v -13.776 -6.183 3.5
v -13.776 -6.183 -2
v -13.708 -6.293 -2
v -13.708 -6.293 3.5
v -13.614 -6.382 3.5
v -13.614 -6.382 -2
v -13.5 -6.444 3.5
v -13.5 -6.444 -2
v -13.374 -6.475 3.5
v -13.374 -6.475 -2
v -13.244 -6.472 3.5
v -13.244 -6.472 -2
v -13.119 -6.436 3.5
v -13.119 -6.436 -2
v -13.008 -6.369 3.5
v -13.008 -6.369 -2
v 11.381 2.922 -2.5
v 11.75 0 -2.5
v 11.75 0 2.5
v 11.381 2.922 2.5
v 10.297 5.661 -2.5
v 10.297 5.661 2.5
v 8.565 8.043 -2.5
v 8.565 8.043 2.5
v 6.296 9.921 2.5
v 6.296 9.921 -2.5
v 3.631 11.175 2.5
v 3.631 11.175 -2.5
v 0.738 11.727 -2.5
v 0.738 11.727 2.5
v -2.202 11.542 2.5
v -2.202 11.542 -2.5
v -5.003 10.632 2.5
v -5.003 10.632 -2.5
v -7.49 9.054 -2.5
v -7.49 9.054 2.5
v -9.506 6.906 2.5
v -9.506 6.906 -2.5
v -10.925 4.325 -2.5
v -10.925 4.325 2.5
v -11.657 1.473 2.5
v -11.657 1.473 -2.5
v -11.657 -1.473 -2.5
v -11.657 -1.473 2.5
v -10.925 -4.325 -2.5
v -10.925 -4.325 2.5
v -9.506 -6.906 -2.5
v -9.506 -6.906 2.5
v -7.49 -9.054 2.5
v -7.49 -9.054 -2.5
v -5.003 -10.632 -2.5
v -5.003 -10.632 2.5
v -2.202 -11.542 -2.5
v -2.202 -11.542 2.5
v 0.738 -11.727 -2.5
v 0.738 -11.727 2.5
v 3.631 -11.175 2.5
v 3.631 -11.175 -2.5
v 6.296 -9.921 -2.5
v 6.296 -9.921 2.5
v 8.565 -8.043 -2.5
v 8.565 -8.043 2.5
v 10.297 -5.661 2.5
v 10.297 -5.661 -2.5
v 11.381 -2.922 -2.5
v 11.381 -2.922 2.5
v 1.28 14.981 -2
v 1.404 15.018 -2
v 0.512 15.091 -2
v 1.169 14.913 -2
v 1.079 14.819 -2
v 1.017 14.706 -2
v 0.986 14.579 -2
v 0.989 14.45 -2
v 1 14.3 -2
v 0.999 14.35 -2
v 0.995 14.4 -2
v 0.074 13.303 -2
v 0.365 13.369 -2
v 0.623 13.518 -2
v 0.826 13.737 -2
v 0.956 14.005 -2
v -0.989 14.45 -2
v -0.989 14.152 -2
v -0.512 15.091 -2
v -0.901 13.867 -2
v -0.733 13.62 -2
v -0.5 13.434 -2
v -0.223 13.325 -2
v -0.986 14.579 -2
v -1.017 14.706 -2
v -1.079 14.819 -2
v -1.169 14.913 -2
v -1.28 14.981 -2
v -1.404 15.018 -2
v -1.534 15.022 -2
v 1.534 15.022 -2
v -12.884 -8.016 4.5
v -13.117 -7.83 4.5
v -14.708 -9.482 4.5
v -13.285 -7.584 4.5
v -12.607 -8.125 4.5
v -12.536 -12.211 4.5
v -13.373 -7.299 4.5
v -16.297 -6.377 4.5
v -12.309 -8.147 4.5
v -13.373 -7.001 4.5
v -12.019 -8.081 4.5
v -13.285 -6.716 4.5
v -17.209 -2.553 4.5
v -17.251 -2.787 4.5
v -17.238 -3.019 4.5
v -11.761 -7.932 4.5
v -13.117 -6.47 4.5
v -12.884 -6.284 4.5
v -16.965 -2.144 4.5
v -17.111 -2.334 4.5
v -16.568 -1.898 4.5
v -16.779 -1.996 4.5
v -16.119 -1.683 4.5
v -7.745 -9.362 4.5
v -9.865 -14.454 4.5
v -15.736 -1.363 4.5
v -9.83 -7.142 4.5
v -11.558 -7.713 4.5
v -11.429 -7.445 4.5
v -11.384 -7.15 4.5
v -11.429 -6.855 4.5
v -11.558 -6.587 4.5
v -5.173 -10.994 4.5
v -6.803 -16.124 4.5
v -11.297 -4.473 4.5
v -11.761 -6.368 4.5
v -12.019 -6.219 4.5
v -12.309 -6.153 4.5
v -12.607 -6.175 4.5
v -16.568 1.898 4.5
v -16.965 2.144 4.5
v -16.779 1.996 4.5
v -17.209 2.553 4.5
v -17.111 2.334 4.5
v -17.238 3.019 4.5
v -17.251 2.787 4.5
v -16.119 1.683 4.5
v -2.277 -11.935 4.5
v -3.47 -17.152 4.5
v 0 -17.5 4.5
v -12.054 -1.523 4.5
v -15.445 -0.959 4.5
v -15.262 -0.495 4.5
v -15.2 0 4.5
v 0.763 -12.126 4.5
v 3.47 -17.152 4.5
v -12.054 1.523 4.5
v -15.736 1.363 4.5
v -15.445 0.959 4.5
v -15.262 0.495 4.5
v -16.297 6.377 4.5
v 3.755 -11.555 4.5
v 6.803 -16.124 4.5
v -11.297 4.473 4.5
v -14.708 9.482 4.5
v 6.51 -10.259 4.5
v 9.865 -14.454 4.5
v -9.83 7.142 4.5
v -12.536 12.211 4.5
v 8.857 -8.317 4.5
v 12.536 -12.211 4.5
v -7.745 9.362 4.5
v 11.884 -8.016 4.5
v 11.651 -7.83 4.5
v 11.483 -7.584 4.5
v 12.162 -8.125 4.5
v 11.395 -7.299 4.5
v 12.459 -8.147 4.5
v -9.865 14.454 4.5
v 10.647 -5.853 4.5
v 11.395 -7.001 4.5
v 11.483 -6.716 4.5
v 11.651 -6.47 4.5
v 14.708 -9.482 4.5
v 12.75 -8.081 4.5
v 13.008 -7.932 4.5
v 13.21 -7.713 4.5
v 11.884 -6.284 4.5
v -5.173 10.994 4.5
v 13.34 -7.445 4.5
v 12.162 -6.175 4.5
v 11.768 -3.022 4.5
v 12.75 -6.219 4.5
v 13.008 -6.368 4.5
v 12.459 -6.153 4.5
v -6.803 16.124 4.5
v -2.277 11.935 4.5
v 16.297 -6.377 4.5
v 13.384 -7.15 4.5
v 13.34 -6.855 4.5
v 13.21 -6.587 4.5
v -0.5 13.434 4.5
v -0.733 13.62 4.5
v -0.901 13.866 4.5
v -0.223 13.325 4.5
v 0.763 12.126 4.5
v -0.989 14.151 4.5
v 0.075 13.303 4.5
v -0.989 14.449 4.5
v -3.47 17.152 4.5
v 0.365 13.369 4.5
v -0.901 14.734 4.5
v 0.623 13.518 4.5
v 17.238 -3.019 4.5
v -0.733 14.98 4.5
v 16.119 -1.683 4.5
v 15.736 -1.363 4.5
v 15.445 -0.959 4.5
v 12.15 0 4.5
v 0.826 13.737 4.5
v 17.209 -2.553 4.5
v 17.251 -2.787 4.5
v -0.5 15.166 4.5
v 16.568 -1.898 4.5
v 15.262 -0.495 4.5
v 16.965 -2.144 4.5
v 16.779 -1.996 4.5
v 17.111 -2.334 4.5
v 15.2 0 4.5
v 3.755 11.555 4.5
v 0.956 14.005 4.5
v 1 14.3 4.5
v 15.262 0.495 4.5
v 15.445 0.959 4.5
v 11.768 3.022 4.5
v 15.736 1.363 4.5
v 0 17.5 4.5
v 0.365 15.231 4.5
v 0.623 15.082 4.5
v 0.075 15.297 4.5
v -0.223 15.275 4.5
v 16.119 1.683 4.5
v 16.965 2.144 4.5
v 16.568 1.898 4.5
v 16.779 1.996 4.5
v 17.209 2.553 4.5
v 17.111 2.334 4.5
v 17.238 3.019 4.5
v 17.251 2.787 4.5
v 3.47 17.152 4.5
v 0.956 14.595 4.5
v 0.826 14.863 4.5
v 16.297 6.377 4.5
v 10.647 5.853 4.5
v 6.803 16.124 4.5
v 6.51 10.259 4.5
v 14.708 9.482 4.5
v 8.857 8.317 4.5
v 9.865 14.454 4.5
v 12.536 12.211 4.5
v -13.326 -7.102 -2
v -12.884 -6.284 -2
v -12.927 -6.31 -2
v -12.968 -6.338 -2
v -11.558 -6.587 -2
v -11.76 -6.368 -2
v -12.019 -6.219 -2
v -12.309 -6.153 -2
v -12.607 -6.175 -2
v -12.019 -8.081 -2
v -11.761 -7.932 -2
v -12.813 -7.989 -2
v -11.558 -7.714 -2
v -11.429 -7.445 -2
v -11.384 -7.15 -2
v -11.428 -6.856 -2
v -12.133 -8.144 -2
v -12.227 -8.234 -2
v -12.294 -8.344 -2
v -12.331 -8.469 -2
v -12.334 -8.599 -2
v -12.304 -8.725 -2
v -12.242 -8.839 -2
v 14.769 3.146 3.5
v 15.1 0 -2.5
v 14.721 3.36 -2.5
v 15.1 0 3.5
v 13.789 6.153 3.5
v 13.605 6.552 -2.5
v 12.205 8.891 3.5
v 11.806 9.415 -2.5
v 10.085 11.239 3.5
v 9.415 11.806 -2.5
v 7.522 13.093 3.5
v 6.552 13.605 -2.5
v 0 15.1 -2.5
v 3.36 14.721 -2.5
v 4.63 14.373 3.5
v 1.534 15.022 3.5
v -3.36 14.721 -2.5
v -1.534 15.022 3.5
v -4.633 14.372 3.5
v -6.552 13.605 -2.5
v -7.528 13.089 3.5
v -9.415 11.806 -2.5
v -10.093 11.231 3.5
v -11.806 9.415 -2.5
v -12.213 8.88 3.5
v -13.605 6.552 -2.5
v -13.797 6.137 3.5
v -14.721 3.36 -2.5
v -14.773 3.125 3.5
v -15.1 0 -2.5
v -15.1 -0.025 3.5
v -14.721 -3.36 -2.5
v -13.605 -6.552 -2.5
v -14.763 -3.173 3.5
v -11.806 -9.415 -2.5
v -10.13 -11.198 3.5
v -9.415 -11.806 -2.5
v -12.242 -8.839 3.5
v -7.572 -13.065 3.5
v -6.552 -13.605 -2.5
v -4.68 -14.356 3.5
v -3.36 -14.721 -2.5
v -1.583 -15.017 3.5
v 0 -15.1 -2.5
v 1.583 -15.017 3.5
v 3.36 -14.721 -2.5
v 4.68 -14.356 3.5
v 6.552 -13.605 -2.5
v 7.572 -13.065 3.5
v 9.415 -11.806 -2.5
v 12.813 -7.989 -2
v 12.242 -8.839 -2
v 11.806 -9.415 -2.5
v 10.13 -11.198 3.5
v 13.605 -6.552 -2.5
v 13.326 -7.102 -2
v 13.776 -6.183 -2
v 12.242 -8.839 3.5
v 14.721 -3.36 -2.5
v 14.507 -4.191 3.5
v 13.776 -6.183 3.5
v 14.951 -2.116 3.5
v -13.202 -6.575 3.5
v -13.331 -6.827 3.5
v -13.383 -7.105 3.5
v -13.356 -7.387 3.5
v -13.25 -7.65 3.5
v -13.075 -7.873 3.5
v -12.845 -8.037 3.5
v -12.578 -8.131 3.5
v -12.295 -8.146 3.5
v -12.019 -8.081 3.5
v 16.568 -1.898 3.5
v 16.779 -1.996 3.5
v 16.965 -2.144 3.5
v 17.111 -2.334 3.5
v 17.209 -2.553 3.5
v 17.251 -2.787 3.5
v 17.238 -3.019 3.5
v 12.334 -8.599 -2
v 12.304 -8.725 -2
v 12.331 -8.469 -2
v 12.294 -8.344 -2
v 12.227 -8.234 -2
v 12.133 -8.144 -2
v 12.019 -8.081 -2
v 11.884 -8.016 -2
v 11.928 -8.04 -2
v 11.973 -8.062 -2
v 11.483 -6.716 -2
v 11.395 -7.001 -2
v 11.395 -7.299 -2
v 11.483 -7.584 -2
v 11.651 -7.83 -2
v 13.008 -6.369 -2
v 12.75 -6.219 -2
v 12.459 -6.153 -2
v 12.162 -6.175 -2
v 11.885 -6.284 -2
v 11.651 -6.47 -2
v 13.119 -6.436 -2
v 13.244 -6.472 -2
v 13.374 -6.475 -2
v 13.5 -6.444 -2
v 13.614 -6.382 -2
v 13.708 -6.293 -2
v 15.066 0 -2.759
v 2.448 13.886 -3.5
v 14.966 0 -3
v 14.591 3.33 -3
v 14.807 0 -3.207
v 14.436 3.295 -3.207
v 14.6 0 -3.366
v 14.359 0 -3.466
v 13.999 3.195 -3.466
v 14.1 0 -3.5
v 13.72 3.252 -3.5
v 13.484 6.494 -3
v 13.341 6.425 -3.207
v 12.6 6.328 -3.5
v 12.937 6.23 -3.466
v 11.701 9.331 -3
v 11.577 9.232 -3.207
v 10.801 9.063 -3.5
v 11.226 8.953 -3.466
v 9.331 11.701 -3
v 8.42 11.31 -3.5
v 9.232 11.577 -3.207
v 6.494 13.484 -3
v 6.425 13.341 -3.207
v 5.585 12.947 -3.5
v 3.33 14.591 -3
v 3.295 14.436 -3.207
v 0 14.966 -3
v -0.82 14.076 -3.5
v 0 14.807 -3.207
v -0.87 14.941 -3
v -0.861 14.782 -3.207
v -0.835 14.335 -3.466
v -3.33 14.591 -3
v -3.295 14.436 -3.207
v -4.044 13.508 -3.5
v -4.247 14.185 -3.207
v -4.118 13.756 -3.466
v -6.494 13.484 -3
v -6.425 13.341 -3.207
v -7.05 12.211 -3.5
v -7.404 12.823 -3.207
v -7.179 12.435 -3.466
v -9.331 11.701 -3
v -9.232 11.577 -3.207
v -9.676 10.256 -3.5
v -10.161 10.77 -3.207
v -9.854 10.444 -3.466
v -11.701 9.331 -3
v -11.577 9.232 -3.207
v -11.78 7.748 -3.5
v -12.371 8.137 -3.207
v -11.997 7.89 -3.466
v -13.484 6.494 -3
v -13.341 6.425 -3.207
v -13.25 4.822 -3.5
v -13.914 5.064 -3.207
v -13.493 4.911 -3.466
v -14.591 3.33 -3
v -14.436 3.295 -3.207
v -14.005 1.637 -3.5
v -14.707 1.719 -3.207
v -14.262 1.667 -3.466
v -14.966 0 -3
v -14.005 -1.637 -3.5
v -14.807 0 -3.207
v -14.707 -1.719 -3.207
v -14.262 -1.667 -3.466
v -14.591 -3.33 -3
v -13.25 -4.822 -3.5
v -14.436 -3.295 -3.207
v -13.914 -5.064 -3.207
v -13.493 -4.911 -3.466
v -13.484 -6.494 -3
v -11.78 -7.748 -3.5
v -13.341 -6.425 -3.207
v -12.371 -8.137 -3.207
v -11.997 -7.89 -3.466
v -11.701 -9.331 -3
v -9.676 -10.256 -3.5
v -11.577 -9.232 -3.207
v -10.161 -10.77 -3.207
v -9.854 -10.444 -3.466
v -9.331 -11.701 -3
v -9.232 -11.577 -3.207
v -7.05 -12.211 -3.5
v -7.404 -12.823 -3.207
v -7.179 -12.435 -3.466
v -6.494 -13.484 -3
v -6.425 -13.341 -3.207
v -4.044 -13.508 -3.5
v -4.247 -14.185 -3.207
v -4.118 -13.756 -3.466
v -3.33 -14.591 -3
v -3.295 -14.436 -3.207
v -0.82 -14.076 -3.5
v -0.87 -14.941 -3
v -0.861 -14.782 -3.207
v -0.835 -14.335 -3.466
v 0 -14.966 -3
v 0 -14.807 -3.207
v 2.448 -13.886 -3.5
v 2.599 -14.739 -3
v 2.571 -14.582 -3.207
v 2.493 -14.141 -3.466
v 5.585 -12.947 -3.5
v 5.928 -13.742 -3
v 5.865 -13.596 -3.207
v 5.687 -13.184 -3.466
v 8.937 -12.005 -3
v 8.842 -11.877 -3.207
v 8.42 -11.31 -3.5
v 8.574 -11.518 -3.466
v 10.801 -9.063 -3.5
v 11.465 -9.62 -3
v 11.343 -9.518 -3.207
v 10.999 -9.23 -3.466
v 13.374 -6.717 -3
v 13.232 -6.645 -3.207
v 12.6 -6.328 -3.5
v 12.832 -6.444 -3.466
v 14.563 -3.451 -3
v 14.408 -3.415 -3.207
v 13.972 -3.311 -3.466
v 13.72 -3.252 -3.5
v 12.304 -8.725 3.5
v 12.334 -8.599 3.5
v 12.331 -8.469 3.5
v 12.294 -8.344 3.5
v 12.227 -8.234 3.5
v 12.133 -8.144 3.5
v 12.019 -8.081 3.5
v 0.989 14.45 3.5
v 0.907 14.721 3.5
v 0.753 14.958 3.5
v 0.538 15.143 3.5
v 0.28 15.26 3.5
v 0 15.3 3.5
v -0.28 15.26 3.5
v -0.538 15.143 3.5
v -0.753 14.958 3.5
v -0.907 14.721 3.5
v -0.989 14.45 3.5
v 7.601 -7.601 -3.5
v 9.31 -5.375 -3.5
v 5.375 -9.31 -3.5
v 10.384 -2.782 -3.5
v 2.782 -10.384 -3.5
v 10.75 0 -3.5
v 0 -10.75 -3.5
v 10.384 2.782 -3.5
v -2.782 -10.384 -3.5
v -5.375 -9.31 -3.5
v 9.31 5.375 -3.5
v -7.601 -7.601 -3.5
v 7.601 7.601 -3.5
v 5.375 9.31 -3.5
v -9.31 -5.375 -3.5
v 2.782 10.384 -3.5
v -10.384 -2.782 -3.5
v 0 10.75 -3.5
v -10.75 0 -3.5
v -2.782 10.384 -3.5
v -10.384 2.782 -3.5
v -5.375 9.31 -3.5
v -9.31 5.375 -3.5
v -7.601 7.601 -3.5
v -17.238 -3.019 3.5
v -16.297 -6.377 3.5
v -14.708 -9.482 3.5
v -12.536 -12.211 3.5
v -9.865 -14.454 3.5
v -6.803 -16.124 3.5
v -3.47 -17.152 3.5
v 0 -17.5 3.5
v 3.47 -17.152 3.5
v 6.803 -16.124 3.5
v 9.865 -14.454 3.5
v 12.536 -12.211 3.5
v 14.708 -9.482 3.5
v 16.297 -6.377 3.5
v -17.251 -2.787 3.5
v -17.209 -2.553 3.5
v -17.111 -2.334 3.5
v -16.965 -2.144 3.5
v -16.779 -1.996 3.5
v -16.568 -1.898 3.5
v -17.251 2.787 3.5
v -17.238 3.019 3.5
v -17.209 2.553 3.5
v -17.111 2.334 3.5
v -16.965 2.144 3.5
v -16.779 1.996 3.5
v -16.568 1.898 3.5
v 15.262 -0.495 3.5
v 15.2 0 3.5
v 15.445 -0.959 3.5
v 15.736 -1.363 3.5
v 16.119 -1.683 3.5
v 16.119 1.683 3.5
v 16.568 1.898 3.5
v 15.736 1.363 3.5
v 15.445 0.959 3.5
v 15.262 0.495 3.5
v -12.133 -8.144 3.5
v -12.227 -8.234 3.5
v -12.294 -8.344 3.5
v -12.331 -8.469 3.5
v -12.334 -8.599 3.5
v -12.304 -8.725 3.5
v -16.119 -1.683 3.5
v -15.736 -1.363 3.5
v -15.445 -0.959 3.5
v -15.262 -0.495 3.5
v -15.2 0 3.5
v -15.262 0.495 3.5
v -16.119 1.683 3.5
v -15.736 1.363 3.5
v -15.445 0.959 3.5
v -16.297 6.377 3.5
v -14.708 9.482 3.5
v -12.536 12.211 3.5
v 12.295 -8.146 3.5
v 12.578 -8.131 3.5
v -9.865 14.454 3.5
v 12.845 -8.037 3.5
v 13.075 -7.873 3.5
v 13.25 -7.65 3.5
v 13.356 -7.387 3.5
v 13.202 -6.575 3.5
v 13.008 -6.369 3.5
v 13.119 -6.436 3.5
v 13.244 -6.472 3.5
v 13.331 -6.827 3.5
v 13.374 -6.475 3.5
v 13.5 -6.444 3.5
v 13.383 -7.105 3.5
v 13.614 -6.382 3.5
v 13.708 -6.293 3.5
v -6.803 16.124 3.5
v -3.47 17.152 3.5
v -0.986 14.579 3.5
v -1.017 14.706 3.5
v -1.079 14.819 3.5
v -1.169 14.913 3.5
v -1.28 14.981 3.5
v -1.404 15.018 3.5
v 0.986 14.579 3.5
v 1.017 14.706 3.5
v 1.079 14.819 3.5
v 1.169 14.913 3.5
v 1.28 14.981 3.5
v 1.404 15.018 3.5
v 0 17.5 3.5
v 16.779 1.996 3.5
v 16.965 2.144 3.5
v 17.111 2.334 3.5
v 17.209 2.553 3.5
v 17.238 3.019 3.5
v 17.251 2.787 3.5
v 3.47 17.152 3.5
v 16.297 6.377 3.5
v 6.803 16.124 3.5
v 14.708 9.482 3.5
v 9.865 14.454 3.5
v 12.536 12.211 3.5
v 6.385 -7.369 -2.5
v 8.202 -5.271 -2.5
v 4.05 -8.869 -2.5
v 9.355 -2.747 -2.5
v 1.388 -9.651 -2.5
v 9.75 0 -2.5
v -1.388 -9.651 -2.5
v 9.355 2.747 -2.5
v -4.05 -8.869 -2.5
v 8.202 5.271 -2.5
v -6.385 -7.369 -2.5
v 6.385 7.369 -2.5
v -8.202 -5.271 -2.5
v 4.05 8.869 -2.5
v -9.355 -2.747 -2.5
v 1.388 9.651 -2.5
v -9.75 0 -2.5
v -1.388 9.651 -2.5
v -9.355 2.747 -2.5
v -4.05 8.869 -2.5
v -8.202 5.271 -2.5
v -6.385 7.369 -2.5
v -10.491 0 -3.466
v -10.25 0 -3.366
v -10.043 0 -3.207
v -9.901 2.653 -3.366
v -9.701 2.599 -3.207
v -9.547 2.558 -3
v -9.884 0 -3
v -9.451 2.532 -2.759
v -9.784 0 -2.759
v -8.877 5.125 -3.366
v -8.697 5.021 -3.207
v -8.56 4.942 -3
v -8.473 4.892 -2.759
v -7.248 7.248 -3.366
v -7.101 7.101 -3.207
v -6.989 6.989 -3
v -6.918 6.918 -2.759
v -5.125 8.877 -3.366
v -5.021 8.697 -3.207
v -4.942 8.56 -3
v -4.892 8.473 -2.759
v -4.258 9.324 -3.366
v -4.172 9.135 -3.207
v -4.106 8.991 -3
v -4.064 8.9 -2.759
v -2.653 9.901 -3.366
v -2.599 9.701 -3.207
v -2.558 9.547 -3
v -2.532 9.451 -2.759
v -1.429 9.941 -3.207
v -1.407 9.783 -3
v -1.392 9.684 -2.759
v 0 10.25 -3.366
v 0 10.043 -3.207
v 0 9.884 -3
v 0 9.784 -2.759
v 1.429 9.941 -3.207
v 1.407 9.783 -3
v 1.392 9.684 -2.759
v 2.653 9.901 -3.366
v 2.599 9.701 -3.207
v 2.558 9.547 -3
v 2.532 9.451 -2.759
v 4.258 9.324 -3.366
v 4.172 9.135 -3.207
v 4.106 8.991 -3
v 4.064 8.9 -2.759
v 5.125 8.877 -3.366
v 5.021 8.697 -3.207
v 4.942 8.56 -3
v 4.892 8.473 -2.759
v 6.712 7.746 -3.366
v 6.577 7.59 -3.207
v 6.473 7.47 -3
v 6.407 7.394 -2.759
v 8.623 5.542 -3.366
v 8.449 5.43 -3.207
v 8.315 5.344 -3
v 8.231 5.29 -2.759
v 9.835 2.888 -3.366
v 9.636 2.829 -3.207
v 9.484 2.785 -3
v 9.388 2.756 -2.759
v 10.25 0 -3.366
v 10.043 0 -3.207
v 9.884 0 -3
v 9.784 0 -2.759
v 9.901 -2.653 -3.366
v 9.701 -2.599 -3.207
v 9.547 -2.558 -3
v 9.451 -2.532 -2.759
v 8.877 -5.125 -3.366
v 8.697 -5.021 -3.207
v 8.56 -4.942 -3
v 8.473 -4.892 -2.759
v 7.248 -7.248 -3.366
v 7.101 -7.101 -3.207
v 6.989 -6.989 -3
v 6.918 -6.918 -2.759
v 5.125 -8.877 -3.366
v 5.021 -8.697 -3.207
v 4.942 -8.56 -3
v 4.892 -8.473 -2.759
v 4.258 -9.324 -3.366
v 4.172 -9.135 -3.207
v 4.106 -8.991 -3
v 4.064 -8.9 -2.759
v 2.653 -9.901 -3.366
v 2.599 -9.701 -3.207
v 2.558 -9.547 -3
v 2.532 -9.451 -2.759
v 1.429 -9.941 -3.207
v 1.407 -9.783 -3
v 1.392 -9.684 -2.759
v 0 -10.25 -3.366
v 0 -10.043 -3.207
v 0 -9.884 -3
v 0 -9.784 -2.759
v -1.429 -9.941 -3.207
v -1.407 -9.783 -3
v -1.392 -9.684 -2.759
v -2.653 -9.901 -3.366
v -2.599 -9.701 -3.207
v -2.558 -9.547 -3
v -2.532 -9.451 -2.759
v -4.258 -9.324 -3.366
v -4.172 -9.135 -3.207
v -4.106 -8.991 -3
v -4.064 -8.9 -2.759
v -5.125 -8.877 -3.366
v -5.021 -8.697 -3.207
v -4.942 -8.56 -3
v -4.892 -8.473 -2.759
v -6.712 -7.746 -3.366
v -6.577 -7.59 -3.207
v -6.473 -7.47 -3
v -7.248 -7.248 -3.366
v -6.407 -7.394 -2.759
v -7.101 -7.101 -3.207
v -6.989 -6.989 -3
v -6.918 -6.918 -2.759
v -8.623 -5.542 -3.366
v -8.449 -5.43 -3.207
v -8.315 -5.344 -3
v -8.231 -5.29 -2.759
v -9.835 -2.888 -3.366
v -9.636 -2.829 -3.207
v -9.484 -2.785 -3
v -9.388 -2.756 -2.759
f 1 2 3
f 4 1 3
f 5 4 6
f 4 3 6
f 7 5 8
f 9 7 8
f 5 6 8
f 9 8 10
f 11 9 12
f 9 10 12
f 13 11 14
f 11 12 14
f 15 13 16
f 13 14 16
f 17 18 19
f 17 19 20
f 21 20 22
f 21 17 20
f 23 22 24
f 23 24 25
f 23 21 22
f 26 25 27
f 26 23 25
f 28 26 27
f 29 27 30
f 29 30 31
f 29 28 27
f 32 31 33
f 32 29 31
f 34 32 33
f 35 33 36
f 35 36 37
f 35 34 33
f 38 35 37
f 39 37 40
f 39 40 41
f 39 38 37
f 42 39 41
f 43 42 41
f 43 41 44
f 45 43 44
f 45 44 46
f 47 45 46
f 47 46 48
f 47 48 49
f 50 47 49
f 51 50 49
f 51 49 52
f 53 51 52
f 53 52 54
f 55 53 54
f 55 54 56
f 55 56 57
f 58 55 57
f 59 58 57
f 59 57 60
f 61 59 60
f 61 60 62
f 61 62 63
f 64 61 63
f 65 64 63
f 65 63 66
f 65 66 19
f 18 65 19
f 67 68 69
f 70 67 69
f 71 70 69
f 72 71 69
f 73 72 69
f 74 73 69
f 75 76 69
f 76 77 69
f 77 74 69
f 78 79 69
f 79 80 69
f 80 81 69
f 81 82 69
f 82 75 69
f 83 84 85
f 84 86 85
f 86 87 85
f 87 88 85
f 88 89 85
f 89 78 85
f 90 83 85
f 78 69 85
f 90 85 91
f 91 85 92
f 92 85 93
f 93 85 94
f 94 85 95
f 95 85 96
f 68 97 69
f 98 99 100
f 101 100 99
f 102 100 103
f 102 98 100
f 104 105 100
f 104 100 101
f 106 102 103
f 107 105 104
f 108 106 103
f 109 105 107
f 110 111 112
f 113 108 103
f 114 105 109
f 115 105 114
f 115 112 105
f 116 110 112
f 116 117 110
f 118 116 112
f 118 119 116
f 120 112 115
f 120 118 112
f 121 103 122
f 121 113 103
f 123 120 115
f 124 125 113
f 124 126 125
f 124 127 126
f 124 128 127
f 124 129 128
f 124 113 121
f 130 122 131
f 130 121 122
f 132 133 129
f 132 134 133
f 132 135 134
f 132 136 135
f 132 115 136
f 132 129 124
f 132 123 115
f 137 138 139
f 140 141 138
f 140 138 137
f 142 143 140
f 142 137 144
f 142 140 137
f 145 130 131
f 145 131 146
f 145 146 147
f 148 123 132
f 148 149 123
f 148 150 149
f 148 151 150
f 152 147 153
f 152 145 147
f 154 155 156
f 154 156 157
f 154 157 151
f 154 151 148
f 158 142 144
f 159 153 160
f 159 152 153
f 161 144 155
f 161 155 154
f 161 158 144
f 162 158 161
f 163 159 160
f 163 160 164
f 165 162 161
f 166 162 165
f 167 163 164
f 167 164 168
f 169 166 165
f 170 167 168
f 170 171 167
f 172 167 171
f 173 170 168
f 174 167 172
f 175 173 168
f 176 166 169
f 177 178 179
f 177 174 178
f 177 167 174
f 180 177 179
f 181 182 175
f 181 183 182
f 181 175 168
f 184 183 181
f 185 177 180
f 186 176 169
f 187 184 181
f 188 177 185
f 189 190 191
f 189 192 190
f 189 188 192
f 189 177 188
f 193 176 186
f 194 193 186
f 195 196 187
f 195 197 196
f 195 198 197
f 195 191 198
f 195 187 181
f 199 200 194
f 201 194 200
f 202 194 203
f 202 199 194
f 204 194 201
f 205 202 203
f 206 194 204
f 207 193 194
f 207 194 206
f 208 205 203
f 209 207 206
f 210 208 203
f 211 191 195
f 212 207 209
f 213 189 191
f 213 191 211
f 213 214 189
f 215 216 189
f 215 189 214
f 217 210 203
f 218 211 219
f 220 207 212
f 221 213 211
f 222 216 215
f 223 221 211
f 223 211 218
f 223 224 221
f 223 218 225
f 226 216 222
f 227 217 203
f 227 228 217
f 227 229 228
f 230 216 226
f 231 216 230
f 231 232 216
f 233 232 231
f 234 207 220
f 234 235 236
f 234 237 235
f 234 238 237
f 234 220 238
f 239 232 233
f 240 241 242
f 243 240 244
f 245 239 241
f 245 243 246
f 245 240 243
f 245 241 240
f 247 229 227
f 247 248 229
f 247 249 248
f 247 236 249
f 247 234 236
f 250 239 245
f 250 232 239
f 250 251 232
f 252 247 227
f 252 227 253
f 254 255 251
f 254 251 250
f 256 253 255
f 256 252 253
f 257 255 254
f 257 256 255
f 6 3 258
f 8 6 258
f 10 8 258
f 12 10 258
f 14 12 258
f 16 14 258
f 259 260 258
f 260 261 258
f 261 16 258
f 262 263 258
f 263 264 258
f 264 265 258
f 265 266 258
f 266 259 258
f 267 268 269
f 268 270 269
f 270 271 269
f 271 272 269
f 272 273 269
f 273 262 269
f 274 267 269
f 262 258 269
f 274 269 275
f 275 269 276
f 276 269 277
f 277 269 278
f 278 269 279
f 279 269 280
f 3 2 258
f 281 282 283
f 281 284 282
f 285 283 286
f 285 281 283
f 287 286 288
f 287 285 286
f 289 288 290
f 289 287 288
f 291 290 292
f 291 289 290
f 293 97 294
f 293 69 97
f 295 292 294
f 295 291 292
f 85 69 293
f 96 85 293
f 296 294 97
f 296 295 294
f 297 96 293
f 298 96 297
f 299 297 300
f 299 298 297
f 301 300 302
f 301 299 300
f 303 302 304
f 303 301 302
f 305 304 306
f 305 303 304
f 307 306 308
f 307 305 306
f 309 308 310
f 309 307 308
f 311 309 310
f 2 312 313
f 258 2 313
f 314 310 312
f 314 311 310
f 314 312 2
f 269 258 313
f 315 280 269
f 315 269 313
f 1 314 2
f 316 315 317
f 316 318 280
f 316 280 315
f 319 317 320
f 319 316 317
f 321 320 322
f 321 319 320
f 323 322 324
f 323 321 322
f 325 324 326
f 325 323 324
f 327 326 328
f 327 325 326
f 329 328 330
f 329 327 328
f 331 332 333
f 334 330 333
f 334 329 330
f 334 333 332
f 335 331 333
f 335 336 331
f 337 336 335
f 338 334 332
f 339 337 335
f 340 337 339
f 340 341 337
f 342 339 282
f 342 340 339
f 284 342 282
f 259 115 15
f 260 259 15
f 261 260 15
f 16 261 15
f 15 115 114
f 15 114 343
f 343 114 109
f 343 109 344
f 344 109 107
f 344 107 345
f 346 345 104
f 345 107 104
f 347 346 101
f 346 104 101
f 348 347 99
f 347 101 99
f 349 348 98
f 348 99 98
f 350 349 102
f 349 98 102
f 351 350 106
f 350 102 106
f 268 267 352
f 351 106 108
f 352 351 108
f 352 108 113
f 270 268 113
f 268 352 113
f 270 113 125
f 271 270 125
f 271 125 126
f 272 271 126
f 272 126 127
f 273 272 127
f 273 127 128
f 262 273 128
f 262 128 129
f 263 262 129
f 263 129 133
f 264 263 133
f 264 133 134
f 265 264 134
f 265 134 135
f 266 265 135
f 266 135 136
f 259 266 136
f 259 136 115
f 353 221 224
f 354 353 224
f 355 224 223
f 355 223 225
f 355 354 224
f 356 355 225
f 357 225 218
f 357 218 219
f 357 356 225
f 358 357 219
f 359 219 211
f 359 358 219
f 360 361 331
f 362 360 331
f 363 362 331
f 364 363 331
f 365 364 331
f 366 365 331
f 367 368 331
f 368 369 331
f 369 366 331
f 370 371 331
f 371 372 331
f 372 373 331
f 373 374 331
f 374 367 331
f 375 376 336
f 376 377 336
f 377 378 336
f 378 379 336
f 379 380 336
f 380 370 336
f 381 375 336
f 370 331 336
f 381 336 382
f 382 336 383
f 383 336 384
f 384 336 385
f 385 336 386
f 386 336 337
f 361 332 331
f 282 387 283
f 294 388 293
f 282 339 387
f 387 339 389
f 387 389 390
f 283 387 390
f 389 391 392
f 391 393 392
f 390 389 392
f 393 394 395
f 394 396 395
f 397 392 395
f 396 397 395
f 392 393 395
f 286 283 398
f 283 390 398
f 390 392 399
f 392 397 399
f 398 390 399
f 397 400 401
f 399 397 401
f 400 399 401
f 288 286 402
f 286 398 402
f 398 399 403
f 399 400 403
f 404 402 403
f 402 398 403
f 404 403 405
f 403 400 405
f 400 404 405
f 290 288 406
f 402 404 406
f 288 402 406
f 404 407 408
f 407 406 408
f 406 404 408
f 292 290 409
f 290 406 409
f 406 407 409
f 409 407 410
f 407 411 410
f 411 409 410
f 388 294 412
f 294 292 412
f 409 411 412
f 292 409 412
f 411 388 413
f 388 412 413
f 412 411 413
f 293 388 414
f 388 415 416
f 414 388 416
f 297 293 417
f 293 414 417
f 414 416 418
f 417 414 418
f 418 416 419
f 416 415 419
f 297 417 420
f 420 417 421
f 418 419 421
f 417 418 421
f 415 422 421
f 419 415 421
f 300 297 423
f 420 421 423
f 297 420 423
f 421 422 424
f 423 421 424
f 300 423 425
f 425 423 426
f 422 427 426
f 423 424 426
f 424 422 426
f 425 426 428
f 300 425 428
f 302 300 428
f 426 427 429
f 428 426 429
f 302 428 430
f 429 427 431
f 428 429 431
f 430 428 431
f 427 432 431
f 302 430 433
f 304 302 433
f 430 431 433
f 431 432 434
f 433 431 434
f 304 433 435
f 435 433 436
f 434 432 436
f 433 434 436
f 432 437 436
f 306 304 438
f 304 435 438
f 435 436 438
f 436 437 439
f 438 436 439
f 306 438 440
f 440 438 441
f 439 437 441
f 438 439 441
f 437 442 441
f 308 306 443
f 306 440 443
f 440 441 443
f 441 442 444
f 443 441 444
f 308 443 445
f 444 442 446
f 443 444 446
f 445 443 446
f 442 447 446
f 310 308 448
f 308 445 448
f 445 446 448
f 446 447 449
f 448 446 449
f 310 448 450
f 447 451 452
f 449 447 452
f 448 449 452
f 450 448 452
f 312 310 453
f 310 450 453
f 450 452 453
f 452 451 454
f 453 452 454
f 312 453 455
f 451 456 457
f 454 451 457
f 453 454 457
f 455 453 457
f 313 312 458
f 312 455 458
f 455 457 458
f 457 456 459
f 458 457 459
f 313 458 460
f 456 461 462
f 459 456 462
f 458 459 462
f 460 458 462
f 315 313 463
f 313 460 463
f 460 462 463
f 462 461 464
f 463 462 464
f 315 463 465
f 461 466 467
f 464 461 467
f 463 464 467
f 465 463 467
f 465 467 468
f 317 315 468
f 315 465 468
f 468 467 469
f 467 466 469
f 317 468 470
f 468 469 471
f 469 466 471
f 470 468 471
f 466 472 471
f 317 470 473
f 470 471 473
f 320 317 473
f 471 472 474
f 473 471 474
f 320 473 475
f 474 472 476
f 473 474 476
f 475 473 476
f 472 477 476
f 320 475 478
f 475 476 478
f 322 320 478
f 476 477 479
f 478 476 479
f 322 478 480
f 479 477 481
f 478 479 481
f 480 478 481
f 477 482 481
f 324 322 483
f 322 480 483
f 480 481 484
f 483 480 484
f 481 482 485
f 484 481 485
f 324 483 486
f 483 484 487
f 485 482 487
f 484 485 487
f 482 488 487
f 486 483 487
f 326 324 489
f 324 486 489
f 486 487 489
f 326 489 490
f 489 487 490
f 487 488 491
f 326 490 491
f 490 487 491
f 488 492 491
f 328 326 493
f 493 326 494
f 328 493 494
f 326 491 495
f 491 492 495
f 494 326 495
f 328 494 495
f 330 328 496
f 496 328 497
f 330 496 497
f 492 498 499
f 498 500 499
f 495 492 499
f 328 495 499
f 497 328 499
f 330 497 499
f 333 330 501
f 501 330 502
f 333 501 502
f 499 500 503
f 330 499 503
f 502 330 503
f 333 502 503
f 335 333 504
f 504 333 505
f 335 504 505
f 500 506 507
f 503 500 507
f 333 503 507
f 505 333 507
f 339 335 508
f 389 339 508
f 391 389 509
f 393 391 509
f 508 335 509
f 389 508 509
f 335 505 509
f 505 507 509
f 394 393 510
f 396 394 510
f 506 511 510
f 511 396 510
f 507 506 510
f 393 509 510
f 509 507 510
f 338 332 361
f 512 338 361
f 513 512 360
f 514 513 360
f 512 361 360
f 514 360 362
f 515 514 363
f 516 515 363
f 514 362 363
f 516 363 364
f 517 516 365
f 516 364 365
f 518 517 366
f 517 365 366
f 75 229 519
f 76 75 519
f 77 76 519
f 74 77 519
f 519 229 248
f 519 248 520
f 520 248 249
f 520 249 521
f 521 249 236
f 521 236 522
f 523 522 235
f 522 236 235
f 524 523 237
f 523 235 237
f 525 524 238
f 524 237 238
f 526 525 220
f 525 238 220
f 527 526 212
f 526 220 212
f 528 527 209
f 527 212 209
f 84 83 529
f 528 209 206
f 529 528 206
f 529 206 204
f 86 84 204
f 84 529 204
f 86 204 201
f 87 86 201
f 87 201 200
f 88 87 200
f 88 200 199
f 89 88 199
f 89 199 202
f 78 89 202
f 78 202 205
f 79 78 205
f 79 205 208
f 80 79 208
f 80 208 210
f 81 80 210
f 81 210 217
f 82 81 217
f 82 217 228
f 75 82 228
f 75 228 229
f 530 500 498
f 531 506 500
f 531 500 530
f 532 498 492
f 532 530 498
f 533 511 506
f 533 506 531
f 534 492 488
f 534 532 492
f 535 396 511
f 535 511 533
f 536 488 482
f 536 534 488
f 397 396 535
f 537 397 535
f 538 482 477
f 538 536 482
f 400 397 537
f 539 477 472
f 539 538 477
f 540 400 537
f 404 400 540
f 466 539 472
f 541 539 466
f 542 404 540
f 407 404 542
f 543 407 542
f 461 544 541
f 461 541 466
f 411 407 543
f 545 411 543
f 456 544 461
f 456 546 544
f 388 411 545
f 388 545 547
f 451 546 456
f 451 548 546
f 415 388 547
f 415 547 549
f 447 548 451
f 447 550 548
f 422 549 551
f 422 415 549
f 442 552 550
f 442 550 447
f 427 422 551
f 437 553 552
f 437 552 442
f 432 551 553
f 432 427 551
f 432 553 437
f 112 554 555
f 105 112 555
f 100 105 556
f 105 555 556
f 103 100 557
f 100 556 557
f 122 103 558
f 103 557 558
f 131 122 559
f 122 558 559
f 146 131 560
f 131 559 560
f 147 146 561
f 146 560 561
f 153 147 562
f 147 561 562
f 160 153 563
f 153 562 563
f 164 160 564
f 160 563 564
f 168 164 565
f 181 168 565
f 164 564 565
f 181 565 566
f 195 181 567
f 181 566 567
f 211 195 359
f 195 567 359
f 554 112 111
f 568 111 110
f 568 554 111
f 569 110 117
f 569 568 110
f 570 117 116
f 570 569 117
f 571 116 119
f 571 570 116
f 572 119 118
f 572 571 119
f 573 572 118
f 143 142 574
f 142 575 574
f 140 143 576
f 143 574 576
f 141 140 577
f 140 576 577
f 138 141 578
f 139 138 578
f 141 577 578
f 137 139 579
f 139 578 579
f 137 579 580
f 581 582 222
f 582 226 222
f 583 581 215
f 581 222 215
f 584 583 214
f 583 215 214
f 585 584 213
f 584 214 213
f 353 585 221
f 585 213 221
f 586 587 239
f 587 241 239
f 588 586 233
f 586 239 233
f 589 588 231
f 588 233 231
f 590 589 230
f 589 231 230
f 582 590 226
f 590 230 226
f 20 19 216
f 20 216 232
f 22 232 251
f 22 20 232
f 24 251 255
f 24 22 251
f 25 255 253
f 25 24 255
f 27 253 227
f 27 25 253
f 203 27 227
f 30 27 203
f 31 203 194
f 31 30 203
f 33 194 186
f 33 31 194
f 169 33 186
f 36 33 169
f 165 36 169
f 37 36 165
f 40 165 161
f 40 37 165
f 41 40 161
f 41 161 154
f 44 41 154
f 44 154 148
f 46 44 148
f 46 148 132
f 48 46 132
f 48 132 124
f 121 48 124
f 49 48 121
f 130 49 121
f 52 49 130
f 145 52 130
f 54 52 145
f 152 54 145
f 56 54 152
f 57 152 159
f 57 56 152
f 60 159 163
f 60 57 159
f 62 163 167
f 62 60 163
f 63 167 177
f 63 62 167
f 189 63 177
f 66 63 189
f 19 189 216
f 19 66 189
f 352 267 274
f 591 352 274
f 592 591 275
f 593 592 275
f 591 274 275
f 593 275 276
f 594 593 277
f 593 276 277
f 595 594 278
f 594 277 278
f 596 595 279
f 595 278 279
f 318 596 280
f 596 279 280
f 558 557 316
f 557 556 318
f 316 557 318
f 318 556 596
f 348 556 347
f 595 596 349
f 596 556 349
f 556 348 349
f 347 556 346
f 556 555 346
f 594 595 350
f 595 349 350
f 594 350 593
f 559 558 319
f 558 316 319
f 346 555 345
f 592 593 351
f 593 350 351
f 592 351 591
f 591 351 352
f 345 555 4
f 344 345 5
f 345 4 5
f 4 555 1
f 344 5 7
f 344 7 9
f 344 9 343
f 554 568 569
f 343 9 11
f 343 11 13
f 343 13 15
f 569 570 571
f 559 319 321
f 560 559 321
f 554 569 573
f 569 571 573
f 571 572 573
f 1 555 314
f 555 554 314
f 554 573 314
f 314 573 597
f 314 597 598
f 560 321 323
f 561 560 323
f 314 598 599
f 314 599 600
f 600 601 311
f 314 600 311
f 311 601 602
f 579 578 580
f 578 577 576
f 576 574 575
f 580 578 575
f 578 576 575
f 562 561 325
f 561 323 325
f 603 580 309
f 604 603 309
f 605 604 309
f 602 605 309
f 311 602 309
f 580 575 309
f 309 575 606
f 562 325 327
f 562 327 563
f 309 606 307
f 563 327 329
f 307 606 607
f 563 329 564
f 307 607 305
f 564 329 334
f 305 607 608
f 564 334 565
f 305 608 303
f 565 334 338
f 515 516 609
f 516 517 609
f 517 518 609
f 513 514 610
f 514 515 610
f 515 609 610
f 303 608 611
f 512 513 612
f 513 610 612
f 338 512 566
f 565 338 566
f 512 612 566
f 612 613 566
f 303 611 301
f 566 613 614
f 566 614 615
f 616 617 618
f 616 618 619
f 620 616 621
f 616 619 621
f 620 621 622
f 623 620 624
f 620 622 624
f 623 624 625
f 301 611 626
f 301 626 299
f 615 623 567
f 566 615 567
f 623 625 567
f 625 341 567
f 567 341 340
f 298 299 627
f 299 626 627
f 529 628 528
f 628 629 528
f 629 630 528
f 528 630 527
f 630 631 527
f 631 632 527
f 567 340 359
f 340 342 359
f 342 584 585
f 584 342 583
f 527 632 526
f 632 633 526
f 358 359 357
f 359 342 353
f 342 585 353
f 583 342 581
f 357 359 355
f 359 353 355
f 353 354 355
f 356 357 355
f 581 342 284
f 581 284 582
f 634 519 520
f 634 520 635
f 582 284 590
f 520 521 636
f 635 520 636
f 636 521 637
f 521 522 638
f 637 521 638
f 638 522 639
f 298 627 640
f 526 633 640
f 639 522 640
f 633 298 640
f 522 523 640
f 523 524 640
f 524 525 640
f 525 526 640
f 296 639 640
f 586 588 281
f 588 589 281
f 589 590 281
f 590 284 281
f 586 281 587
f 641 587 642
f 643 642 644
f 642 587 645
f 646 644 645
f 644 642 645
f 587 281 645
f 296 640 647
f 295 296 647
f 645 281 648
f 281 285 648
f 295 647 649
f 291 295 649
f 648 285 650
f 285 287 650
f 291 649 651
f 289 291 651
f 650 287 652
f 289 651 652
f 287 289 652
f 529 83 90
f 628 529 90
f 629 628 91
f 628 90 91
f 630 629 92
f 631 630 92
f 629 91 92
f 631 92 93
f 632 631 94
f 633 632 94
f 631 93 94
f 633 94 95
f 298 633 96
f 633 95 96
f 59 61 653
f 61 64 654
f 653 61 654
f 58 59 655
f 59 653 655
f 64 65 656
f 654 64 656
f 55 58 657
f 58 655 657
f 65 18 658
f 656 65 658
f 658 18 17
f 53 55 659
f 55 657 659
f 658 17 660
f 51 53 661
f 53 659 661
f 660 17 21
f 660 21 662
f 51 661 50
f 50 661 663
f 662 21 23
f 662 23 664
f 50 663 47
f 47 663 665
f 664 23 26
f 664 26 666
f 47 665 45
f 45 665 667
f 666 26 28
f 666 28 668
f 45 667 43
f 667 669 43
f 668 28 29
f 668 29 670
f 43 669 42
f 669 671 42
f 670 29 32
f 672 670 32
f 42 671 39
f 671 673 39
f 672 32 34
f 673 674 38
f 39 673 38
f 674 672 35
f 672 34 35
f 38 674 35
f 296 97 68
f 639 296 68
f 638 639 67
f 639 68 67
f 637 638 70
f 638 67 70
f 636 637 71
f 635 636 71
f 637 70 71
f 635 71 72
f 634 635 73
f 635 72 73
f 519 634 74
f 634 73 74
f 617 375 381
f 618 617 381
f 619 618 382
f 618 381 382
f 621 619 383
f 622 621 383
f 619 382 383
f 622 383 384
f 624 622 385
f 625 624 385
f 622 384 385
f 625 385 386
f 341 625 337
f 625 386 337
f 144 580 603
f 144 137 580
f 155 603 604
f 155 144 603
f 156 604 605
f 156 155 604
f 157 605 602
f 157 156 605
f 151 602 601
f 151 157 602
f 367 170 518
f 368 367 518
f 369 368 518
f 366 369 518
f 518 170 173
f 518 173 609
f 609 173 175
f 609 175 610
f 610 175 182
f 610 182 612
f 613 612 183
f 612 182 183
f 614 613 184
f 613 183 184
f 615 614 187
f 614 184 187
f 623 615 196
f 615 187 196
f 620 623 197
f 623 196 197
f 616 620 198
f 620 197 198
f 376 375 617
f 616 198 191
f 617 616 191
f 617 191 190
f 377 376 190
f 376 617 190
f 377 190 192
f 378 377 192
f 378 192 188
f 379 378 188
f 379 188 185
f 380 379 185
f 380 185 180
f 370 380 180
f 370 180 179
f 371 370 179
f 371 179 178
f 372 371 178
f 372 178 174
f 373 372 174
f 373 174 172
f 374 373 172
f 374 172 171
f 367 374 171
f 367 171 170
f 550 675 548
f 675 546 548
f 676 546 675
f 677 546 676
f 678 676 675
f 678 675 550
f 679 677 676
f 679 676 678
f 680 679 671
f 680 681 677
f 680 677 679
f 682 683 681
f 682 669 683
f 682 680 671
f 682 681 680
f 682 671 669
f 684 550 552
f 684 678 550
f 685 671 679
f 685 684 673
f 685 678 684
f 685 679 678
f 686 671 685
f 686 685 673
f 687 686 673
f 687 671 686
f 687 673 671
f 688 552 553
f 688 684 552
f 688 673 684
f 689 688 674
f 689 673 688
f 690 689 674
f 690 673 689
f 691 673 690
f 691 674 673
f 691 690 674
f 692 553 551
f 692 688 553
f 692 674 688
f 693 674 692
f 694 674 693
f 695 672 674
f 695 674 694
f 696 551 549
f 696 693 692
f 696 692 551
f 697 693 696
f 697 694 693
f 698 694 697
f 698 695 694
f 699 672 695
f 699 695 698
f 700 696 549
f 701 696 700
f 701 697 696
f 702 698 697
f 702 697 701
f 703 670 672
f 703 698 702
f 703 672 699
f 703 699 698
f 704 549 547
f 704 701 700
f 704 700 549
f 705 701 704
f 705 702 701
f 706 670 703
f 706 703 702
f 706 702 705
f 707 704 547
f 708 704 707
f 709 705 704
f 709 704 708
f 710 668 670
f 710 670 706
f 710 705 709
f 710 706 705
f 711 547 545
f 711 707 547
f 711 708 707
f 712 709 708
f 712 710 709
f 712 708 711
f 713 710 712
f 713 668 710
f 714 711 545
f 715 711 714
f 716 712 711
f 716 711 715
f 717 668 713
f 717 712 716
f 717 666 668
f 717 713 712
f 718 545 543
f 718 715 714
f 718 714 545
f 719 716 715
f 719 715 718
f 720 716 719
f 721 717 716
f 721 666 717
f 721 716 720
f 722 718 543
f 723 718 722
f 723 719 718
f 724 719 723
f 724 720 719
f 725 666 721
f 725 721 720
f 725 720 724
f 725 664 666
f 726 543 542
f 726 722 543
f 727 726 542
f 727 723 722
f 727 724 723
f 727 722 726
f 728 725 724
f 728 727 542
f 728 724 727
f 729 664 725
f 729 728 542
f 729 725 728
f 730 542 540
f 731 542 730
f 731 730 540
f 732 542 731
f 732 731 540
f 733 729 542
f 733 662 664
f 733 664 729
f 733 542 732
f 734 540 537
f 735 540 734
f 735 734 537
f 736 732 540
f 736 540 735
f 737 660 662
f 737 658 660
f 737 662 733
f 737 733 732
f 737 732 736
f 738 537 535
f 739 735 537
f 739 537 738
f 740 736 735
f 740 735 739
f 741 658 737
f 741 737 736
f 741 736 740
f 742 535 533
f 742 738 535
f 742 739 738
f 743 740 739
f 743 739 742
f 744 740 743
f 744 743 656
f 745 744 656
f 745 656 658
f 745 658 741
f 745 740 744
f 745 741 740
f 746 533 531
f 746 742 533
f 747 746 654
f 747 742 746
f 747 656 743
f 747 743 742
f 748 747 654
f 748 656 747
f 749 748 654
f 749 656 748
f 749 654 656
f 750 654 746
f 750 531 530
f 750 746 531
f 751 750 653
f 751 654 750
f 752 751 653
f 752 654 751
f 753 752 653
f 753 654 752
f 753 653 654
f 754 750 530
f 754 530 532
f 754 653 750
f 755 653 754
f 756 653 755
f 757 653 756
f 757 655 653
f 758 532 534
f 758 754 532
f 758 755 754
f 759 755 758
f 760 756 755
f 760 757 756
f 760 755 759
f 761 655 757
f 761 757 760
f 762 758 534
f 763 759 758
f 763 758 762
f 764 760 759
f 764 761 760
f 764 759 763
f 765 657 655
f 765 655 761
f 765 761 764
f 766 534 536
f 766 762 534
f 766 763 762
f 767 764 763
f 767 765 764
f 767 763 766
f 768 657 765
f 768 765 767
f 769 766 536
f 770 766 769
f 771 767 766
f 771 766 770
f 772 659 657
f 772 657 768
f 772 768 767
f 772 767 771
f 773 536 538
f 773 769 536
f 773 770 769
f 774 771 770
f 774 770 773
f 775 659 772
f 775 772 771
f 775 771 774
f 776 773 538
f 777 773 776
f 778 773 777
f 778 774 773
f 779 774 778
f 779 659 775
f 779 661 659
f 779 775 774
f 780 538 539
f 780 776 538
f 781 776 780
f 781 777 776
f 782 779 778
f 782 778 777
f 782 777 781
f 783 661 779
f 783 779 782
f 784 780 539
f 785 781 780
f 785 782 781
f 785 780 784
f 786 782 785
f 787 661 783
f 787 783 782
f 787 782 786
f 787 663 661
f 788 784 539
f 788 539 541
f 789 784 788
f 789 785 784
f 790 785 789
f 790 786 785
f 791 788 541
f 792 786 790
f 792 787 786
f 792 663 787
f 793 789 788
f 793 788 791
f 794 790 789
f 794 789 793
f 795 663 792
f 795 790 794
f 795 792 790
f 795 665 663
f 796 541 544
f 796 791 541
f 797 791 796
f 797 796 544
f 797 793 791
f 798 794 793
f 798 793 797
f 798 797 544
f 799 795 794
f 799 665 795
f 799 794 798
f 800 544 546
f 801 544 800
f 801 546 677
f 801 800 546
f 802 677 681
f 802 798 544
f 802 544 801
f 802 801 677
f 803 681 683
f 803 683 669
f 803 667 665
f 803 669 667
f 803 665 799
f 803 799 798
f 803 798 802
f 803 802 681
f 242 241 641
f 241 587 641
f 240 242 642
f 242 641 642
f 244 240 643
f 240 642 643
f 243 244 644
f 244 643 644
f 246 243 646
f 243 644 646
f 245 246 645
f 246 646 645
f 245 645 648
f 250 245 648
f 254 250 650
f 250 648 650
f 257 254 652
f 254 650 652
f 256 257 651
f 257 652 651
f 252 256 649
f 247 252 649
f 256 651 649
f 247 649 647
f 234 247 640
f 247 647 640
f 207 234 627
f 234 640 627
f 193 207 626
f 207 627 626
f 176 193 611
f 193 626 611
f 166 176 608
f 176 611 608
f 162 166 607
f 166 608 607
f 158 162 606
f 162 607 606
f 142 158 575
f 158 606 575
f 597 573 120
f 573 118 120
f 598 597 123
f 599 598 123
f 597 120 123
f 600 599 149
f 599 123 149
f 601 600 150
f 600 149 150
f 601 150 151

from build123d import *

# Parameters (mm, degrees)
SKETCH_1_R               = 15.1
SKETCH_1_R_2             = 11.750000000000002
EXTRUDE_1_DEPTH          = 3.5
SKETCH_2_R               = 11.750000000000004
SKETCH_2_R_2             = 9.750000000000002
EXTRUDE_2_DEPTH          = 1
FILLET_1_R               = 1
FILLET_2_R               = 1
SKETCH_3_R               = 17.500000000000004
SKETCH_3_R_2             = 11.750000000000002
EXTRUDE_3_DEPTH          = 1
CUT_EXTRUDE_1_DEPTH      = 26.719642299223374
FILLET_3_R               = 2
FILLET_4_R               = 1
SKETCH_6_R               = 1.0000000000000007
CUT_EXTRUDE_2_DEPTH      = 6.5
PATTERN_CIRCULAR_2_COUNT = 3
FILLET_6_R               = 0.5
CHAMFER_1_SIZE           = 0.4
CHAMFER_1_SIZE2          = 2


# Some blends are built 0.0001 mm under size
with BuildPart() as part:
    # 草图1 → 凸台-拉伸1 (new, symmetric)
    with BuildSketch(Plane.XY):
        Circle(SKETCH_1_R)
        Circle(SKETCH_1_R_2, mode=Mode.SUBTRACT)
    extrude(amount=EXTRUDE_1_DEPTH, both=True)

    # 草图2 → 凸台-拉伸2 (add)
    with BuildSketch(Plane(origin=(0, 0, -3.5), x_dir=(-1, 0, 0), z_dir=(0, 0, -1))):
        Circle(SKETCH_2_R)
        Circle(SKETCH_2_R_2, mode=Mode.SUBTRACT)
    extrude(amount=-EXTRUDE_2_DEPTH)

    # 圆角1
    fillet_1_edges = [part.edges().sort_by_distance(p)[0] for p in [
        (-15.1, 1.85e-15, -3.5),
    ]]
    fillet(fillet_1_edges, radius=FILLET_1_R)

    # 圆角2
    fillet_2_edges = [part.edges().sort_by_distance(p)[0] for p in [
        (9.750000000000002, 1.19e-15, -3.5),
    ]]
    fillet(fillet_2_edges, radius=FILLET_2_R - 0.0001)  # a hair under: the kernel refuses the full size

    # 草图3 → 凸台-拉伸3 (add)
    with BuildSketch(Plane.XY.offset(3.5)):
        Circle(SKETCH_3_R)
        with Locations(Location((0, 0, 0), (0, 0, 180))):
            Circle(SKETCH_3_R_2, mode=Mode.SUBTRACT)
    extrude(amount=EXTRUDE_3_DEPTH)

    # 草图4 → 切除-拉伸1 (cut, through all)
    with BuildSketch(Plane(origin=(0, 0, 3.5), x_dir=(-1, 0, 0), z_dir=(0, 0, -1))):
        with BuildLine():
            Line((-20.056660766424834, 2), (-15.06784656146989, 2))
            ThreePointArc((-15.06784656146989, 2), (-15.2, 1.86e-15), (-15.06784656146989, -2))
            Line((-15.06784656146989, -2), (-20.056660766424834, -2))
            Line((-20.056660766424834, -2), (-20.056660766424834, 2))
        make_face()
    cut_extrude_1 = extrude(amount=-CUT_EXTRUDE_1_DEPTH, mode=Mode.SUBTRACT)

    # 镜向1: 切除-拉伸1 across plane
    add(cut_extrude_1.mirror(Plane(origin=(0, 0, 0), x_dir=(0, 0, 1), z_dir=(1, 0, 0))), mode=Mode.SUBTRACT)

    # 圆角3
    fillet_3_edges = [part.edges().sort_by_distance(p)[0] for p in [
        (-15.067846561469892, -2, 4),
        (-15.067846561469892, 2, 4),
        (15.067846561469892, -2, 4),
        (15.067846561469892, 2, 4),
    ]]
    fillet(fillet_3_edges, radius=FILLET_3_R - 0.0001)  # a hair under: the kernel refuses the full size

    # 圆角4
    fillet_4_edges = [part.edges().sort_by_distance(p)[0] for p in [
        (17.385338650713713, 2, 4),
        (17.385338650713713, -2, 4),
        (-17.385338650713713, -2, 4),
        (-17.385338650713713, 2, 4),
    ]]
    fillet(fillet_4_edges, radius=FILLET_4_R)

    # 草图6 → 切除-拉伸2 (cut)
    with BuildSketch(Plane.XY.offset(4.500000000000001)):
        with Locations((7.1e-16, 14.299999999999999)):
            Circle(SKETCH_6_R)
    cut_extrude_2 = extrude(amount=-CUT_EXTRUDE_2_DEPTH, mode=Mode.SUBTRACT)

    # 阵列(圆周)2: 切除-拉伸2 ×3 about axis
    pattern_circular_2_axis = Axis((6.2e-16, -9.3e-16, 0), (0, 0, 1))
    for i in range(1, PATTERN_CIRCULAR_2_COUNT):
        add(cut_extrude_2.rotate(pattern_circular_2_axis, i * 360 / PATTERN_CIRCULAR_2_COUNT), mode=Mode.SUBTRACT)

    # 圆角6
    # the kernel refuses this fillet: 0.5 mm, written as the material it takes off along each edge
    with BuildSketch(Plane(origin=(-0.6164263274586522, 15.087412587412588, -1.9999999999999991), x_dir=(-0.9974594960272485, -0.0712359023601691, 0), z_dir=(0, 0, 1))) as fillet_6_piece_1:
        with BuildLine():
            CenterArc((0.9045816644890499, 0.49976803448578755), FILLET_6_R, 167.30835919933298, 104.43698518013807)
            ThreePointArc((0.41679836041578583, 0.6096199724175768), (0.2667346233621471, 0.2649259303036035), (0, 0))
            ThreePointArc((0, 0), (0.4599051560196865, -0.00700535852919151), (0.9198103120393711, 0))
        make_face()
    extrude(amount=5.499999999999999, mode=Mode.SUBTRACT)
    with BuildSketch(Plane(origin=(0.6164263274586537, 15.087412587412588, -1.9999999999999991), x_dir=(0.9974594960272485, -0.0712359023601691, 0), z_dir=(0, 0, 1))) as fillet_6_piece_2:
        with BuildLine():
            CenterArc((0.90458166448905, -0.49976803448578755), FILLET_6_R, 88.25465562052895, 104.43698518013832)
            ThreePointArc((0.41679836041578633, -0.6096199724175786), (0.266734623362148, -0.26492593030360523), (0, 0))
            ThreePointArc((0, 0), (0.45990515601968684, 0.00700535852919153), (0.9198103120393712, 0))
        make_face()
    extrude(amount=5.499999999999999, mode=Mode.SUBTRACT)
    with BuildSketch(Plane(origin=(13.374295741805769, -7.00986543456549, -1.9999999999999991), x_dir=(0.4370376469082089, 0.8994432139857056, 0), z_dir=(0, 0, 1))) as fillet_6_piece_3:
        with BuildLine():
            CenterArc((0.9045816644889654, 0.4997680344857882), FILLET_6_R, 167.30835919933284, 104.4369851801381)
            ThreePointArc((0.41679836041570123, 0.6096199724175785), (0.2667346233620795, 0.26492593030362477), (0, 0))
            ThreePointArc((0, 0), (0.45990515601963466, -0.00700535852919092), (0.9198103120392858, 0))
        make_face()
    extrude(amount=5.499999999999999, mode=Mode.SUBTRACT)
    with BuildSketch(Plane(origin=(12.757869414347034, -8.077547152847108, -1.9999999999999991), x_dir=(-0.5604218491190406, -0.8282073116255346, 0), z_dir=(0, 0, 1))) as fillet_6_piece_4:
        with BuildLine():
            CenterArc((0.9045816644889654, -0.49976803448578744), FILLET_6_R, 88.25465562052915, 104.43698518013807)
            ThreePointArc((0.4167983604157008, -0.6096199724175783), (0.26673462336207926, -0.264925930303624), (0, 0))
            ThreePointArc((0, 0), (0.4599051560196484, 0.00700535852919206), (0.9198103120392849, 3e-17))
        make_face()
    extrude(amount=5.499999999999999, mode=Mode.SUBTRACT)
    with BuildSketch(Plane(origin=(-12.757869414347084, -8.07754715284703, -1.9999999999999991), x_dir=(0.5604218491190395, -0.8282073116255352, 0), z_dir=(0, 0, 1))) as fillet_6_piece_5:
        with BuildLine():
            CenterArc((0.9045816644890518, 0.4997680344857874), FILLET_6_R, 167.30835919933295, 104.43698518013798)
            ThreePointArc((0.4167983604157886, 0.6096199724175766), (0.26673462336214776, 0.26492593030360556), (0, 0))
            ThreePointArc((0, 0), (0.4599051560196818, -0.00700535852919271), (0.9198103120393719, 3e-17))
        make_face()
    extrude(amount=5.499999999999999, mode=Mode.SUBTRACT)
    with BuildSketch(Plane(origin=(-13.374295741805737, -7.009865434565554, -1.9999999999999991), x_dir=(-0.43703764690820945, 0.8994432139857054, 0), z_dir=(0, 0, 1))) as fillet_6_piece_6:
        with BuildLine():
            CenterArc((0.9045816644890493, -0.4997680344857882), FILLET_6_R, 88.25465562052901, 104.43698518013812)
            ThreePointArc((0.4167983604157851, -0.6096199724175783), (0.2667346233621474, -0.26492593030360473), (0, 0))
            ThreePointArc((0, 0), (0.4599051560196919, 0.00700535852919249), (0.91981031203937, 2e-17))
        make_face()
    extrude(amount=5.499999999999999, mode=Mode.SUBTRACT)

    # 倒角1
    chamfer_1_edges = [part.edges().sort_by_distance(p)[0] for p in [
        (11.750000000000002, -8.1e-15, 4.5),
    ]]
    chamfer_1_side = [part.faces().sort_by_distance(p)[0] for p in [
        (15.179125181594527, 1.457318687256729, 4.5),
    ]]
    chamfer(chamfer_1_edges, length=CHAMFER_1_SIZE, length2=CHAMFER_1_SIZE2, reference=chamfer_1_side[0])


solid = part.part
